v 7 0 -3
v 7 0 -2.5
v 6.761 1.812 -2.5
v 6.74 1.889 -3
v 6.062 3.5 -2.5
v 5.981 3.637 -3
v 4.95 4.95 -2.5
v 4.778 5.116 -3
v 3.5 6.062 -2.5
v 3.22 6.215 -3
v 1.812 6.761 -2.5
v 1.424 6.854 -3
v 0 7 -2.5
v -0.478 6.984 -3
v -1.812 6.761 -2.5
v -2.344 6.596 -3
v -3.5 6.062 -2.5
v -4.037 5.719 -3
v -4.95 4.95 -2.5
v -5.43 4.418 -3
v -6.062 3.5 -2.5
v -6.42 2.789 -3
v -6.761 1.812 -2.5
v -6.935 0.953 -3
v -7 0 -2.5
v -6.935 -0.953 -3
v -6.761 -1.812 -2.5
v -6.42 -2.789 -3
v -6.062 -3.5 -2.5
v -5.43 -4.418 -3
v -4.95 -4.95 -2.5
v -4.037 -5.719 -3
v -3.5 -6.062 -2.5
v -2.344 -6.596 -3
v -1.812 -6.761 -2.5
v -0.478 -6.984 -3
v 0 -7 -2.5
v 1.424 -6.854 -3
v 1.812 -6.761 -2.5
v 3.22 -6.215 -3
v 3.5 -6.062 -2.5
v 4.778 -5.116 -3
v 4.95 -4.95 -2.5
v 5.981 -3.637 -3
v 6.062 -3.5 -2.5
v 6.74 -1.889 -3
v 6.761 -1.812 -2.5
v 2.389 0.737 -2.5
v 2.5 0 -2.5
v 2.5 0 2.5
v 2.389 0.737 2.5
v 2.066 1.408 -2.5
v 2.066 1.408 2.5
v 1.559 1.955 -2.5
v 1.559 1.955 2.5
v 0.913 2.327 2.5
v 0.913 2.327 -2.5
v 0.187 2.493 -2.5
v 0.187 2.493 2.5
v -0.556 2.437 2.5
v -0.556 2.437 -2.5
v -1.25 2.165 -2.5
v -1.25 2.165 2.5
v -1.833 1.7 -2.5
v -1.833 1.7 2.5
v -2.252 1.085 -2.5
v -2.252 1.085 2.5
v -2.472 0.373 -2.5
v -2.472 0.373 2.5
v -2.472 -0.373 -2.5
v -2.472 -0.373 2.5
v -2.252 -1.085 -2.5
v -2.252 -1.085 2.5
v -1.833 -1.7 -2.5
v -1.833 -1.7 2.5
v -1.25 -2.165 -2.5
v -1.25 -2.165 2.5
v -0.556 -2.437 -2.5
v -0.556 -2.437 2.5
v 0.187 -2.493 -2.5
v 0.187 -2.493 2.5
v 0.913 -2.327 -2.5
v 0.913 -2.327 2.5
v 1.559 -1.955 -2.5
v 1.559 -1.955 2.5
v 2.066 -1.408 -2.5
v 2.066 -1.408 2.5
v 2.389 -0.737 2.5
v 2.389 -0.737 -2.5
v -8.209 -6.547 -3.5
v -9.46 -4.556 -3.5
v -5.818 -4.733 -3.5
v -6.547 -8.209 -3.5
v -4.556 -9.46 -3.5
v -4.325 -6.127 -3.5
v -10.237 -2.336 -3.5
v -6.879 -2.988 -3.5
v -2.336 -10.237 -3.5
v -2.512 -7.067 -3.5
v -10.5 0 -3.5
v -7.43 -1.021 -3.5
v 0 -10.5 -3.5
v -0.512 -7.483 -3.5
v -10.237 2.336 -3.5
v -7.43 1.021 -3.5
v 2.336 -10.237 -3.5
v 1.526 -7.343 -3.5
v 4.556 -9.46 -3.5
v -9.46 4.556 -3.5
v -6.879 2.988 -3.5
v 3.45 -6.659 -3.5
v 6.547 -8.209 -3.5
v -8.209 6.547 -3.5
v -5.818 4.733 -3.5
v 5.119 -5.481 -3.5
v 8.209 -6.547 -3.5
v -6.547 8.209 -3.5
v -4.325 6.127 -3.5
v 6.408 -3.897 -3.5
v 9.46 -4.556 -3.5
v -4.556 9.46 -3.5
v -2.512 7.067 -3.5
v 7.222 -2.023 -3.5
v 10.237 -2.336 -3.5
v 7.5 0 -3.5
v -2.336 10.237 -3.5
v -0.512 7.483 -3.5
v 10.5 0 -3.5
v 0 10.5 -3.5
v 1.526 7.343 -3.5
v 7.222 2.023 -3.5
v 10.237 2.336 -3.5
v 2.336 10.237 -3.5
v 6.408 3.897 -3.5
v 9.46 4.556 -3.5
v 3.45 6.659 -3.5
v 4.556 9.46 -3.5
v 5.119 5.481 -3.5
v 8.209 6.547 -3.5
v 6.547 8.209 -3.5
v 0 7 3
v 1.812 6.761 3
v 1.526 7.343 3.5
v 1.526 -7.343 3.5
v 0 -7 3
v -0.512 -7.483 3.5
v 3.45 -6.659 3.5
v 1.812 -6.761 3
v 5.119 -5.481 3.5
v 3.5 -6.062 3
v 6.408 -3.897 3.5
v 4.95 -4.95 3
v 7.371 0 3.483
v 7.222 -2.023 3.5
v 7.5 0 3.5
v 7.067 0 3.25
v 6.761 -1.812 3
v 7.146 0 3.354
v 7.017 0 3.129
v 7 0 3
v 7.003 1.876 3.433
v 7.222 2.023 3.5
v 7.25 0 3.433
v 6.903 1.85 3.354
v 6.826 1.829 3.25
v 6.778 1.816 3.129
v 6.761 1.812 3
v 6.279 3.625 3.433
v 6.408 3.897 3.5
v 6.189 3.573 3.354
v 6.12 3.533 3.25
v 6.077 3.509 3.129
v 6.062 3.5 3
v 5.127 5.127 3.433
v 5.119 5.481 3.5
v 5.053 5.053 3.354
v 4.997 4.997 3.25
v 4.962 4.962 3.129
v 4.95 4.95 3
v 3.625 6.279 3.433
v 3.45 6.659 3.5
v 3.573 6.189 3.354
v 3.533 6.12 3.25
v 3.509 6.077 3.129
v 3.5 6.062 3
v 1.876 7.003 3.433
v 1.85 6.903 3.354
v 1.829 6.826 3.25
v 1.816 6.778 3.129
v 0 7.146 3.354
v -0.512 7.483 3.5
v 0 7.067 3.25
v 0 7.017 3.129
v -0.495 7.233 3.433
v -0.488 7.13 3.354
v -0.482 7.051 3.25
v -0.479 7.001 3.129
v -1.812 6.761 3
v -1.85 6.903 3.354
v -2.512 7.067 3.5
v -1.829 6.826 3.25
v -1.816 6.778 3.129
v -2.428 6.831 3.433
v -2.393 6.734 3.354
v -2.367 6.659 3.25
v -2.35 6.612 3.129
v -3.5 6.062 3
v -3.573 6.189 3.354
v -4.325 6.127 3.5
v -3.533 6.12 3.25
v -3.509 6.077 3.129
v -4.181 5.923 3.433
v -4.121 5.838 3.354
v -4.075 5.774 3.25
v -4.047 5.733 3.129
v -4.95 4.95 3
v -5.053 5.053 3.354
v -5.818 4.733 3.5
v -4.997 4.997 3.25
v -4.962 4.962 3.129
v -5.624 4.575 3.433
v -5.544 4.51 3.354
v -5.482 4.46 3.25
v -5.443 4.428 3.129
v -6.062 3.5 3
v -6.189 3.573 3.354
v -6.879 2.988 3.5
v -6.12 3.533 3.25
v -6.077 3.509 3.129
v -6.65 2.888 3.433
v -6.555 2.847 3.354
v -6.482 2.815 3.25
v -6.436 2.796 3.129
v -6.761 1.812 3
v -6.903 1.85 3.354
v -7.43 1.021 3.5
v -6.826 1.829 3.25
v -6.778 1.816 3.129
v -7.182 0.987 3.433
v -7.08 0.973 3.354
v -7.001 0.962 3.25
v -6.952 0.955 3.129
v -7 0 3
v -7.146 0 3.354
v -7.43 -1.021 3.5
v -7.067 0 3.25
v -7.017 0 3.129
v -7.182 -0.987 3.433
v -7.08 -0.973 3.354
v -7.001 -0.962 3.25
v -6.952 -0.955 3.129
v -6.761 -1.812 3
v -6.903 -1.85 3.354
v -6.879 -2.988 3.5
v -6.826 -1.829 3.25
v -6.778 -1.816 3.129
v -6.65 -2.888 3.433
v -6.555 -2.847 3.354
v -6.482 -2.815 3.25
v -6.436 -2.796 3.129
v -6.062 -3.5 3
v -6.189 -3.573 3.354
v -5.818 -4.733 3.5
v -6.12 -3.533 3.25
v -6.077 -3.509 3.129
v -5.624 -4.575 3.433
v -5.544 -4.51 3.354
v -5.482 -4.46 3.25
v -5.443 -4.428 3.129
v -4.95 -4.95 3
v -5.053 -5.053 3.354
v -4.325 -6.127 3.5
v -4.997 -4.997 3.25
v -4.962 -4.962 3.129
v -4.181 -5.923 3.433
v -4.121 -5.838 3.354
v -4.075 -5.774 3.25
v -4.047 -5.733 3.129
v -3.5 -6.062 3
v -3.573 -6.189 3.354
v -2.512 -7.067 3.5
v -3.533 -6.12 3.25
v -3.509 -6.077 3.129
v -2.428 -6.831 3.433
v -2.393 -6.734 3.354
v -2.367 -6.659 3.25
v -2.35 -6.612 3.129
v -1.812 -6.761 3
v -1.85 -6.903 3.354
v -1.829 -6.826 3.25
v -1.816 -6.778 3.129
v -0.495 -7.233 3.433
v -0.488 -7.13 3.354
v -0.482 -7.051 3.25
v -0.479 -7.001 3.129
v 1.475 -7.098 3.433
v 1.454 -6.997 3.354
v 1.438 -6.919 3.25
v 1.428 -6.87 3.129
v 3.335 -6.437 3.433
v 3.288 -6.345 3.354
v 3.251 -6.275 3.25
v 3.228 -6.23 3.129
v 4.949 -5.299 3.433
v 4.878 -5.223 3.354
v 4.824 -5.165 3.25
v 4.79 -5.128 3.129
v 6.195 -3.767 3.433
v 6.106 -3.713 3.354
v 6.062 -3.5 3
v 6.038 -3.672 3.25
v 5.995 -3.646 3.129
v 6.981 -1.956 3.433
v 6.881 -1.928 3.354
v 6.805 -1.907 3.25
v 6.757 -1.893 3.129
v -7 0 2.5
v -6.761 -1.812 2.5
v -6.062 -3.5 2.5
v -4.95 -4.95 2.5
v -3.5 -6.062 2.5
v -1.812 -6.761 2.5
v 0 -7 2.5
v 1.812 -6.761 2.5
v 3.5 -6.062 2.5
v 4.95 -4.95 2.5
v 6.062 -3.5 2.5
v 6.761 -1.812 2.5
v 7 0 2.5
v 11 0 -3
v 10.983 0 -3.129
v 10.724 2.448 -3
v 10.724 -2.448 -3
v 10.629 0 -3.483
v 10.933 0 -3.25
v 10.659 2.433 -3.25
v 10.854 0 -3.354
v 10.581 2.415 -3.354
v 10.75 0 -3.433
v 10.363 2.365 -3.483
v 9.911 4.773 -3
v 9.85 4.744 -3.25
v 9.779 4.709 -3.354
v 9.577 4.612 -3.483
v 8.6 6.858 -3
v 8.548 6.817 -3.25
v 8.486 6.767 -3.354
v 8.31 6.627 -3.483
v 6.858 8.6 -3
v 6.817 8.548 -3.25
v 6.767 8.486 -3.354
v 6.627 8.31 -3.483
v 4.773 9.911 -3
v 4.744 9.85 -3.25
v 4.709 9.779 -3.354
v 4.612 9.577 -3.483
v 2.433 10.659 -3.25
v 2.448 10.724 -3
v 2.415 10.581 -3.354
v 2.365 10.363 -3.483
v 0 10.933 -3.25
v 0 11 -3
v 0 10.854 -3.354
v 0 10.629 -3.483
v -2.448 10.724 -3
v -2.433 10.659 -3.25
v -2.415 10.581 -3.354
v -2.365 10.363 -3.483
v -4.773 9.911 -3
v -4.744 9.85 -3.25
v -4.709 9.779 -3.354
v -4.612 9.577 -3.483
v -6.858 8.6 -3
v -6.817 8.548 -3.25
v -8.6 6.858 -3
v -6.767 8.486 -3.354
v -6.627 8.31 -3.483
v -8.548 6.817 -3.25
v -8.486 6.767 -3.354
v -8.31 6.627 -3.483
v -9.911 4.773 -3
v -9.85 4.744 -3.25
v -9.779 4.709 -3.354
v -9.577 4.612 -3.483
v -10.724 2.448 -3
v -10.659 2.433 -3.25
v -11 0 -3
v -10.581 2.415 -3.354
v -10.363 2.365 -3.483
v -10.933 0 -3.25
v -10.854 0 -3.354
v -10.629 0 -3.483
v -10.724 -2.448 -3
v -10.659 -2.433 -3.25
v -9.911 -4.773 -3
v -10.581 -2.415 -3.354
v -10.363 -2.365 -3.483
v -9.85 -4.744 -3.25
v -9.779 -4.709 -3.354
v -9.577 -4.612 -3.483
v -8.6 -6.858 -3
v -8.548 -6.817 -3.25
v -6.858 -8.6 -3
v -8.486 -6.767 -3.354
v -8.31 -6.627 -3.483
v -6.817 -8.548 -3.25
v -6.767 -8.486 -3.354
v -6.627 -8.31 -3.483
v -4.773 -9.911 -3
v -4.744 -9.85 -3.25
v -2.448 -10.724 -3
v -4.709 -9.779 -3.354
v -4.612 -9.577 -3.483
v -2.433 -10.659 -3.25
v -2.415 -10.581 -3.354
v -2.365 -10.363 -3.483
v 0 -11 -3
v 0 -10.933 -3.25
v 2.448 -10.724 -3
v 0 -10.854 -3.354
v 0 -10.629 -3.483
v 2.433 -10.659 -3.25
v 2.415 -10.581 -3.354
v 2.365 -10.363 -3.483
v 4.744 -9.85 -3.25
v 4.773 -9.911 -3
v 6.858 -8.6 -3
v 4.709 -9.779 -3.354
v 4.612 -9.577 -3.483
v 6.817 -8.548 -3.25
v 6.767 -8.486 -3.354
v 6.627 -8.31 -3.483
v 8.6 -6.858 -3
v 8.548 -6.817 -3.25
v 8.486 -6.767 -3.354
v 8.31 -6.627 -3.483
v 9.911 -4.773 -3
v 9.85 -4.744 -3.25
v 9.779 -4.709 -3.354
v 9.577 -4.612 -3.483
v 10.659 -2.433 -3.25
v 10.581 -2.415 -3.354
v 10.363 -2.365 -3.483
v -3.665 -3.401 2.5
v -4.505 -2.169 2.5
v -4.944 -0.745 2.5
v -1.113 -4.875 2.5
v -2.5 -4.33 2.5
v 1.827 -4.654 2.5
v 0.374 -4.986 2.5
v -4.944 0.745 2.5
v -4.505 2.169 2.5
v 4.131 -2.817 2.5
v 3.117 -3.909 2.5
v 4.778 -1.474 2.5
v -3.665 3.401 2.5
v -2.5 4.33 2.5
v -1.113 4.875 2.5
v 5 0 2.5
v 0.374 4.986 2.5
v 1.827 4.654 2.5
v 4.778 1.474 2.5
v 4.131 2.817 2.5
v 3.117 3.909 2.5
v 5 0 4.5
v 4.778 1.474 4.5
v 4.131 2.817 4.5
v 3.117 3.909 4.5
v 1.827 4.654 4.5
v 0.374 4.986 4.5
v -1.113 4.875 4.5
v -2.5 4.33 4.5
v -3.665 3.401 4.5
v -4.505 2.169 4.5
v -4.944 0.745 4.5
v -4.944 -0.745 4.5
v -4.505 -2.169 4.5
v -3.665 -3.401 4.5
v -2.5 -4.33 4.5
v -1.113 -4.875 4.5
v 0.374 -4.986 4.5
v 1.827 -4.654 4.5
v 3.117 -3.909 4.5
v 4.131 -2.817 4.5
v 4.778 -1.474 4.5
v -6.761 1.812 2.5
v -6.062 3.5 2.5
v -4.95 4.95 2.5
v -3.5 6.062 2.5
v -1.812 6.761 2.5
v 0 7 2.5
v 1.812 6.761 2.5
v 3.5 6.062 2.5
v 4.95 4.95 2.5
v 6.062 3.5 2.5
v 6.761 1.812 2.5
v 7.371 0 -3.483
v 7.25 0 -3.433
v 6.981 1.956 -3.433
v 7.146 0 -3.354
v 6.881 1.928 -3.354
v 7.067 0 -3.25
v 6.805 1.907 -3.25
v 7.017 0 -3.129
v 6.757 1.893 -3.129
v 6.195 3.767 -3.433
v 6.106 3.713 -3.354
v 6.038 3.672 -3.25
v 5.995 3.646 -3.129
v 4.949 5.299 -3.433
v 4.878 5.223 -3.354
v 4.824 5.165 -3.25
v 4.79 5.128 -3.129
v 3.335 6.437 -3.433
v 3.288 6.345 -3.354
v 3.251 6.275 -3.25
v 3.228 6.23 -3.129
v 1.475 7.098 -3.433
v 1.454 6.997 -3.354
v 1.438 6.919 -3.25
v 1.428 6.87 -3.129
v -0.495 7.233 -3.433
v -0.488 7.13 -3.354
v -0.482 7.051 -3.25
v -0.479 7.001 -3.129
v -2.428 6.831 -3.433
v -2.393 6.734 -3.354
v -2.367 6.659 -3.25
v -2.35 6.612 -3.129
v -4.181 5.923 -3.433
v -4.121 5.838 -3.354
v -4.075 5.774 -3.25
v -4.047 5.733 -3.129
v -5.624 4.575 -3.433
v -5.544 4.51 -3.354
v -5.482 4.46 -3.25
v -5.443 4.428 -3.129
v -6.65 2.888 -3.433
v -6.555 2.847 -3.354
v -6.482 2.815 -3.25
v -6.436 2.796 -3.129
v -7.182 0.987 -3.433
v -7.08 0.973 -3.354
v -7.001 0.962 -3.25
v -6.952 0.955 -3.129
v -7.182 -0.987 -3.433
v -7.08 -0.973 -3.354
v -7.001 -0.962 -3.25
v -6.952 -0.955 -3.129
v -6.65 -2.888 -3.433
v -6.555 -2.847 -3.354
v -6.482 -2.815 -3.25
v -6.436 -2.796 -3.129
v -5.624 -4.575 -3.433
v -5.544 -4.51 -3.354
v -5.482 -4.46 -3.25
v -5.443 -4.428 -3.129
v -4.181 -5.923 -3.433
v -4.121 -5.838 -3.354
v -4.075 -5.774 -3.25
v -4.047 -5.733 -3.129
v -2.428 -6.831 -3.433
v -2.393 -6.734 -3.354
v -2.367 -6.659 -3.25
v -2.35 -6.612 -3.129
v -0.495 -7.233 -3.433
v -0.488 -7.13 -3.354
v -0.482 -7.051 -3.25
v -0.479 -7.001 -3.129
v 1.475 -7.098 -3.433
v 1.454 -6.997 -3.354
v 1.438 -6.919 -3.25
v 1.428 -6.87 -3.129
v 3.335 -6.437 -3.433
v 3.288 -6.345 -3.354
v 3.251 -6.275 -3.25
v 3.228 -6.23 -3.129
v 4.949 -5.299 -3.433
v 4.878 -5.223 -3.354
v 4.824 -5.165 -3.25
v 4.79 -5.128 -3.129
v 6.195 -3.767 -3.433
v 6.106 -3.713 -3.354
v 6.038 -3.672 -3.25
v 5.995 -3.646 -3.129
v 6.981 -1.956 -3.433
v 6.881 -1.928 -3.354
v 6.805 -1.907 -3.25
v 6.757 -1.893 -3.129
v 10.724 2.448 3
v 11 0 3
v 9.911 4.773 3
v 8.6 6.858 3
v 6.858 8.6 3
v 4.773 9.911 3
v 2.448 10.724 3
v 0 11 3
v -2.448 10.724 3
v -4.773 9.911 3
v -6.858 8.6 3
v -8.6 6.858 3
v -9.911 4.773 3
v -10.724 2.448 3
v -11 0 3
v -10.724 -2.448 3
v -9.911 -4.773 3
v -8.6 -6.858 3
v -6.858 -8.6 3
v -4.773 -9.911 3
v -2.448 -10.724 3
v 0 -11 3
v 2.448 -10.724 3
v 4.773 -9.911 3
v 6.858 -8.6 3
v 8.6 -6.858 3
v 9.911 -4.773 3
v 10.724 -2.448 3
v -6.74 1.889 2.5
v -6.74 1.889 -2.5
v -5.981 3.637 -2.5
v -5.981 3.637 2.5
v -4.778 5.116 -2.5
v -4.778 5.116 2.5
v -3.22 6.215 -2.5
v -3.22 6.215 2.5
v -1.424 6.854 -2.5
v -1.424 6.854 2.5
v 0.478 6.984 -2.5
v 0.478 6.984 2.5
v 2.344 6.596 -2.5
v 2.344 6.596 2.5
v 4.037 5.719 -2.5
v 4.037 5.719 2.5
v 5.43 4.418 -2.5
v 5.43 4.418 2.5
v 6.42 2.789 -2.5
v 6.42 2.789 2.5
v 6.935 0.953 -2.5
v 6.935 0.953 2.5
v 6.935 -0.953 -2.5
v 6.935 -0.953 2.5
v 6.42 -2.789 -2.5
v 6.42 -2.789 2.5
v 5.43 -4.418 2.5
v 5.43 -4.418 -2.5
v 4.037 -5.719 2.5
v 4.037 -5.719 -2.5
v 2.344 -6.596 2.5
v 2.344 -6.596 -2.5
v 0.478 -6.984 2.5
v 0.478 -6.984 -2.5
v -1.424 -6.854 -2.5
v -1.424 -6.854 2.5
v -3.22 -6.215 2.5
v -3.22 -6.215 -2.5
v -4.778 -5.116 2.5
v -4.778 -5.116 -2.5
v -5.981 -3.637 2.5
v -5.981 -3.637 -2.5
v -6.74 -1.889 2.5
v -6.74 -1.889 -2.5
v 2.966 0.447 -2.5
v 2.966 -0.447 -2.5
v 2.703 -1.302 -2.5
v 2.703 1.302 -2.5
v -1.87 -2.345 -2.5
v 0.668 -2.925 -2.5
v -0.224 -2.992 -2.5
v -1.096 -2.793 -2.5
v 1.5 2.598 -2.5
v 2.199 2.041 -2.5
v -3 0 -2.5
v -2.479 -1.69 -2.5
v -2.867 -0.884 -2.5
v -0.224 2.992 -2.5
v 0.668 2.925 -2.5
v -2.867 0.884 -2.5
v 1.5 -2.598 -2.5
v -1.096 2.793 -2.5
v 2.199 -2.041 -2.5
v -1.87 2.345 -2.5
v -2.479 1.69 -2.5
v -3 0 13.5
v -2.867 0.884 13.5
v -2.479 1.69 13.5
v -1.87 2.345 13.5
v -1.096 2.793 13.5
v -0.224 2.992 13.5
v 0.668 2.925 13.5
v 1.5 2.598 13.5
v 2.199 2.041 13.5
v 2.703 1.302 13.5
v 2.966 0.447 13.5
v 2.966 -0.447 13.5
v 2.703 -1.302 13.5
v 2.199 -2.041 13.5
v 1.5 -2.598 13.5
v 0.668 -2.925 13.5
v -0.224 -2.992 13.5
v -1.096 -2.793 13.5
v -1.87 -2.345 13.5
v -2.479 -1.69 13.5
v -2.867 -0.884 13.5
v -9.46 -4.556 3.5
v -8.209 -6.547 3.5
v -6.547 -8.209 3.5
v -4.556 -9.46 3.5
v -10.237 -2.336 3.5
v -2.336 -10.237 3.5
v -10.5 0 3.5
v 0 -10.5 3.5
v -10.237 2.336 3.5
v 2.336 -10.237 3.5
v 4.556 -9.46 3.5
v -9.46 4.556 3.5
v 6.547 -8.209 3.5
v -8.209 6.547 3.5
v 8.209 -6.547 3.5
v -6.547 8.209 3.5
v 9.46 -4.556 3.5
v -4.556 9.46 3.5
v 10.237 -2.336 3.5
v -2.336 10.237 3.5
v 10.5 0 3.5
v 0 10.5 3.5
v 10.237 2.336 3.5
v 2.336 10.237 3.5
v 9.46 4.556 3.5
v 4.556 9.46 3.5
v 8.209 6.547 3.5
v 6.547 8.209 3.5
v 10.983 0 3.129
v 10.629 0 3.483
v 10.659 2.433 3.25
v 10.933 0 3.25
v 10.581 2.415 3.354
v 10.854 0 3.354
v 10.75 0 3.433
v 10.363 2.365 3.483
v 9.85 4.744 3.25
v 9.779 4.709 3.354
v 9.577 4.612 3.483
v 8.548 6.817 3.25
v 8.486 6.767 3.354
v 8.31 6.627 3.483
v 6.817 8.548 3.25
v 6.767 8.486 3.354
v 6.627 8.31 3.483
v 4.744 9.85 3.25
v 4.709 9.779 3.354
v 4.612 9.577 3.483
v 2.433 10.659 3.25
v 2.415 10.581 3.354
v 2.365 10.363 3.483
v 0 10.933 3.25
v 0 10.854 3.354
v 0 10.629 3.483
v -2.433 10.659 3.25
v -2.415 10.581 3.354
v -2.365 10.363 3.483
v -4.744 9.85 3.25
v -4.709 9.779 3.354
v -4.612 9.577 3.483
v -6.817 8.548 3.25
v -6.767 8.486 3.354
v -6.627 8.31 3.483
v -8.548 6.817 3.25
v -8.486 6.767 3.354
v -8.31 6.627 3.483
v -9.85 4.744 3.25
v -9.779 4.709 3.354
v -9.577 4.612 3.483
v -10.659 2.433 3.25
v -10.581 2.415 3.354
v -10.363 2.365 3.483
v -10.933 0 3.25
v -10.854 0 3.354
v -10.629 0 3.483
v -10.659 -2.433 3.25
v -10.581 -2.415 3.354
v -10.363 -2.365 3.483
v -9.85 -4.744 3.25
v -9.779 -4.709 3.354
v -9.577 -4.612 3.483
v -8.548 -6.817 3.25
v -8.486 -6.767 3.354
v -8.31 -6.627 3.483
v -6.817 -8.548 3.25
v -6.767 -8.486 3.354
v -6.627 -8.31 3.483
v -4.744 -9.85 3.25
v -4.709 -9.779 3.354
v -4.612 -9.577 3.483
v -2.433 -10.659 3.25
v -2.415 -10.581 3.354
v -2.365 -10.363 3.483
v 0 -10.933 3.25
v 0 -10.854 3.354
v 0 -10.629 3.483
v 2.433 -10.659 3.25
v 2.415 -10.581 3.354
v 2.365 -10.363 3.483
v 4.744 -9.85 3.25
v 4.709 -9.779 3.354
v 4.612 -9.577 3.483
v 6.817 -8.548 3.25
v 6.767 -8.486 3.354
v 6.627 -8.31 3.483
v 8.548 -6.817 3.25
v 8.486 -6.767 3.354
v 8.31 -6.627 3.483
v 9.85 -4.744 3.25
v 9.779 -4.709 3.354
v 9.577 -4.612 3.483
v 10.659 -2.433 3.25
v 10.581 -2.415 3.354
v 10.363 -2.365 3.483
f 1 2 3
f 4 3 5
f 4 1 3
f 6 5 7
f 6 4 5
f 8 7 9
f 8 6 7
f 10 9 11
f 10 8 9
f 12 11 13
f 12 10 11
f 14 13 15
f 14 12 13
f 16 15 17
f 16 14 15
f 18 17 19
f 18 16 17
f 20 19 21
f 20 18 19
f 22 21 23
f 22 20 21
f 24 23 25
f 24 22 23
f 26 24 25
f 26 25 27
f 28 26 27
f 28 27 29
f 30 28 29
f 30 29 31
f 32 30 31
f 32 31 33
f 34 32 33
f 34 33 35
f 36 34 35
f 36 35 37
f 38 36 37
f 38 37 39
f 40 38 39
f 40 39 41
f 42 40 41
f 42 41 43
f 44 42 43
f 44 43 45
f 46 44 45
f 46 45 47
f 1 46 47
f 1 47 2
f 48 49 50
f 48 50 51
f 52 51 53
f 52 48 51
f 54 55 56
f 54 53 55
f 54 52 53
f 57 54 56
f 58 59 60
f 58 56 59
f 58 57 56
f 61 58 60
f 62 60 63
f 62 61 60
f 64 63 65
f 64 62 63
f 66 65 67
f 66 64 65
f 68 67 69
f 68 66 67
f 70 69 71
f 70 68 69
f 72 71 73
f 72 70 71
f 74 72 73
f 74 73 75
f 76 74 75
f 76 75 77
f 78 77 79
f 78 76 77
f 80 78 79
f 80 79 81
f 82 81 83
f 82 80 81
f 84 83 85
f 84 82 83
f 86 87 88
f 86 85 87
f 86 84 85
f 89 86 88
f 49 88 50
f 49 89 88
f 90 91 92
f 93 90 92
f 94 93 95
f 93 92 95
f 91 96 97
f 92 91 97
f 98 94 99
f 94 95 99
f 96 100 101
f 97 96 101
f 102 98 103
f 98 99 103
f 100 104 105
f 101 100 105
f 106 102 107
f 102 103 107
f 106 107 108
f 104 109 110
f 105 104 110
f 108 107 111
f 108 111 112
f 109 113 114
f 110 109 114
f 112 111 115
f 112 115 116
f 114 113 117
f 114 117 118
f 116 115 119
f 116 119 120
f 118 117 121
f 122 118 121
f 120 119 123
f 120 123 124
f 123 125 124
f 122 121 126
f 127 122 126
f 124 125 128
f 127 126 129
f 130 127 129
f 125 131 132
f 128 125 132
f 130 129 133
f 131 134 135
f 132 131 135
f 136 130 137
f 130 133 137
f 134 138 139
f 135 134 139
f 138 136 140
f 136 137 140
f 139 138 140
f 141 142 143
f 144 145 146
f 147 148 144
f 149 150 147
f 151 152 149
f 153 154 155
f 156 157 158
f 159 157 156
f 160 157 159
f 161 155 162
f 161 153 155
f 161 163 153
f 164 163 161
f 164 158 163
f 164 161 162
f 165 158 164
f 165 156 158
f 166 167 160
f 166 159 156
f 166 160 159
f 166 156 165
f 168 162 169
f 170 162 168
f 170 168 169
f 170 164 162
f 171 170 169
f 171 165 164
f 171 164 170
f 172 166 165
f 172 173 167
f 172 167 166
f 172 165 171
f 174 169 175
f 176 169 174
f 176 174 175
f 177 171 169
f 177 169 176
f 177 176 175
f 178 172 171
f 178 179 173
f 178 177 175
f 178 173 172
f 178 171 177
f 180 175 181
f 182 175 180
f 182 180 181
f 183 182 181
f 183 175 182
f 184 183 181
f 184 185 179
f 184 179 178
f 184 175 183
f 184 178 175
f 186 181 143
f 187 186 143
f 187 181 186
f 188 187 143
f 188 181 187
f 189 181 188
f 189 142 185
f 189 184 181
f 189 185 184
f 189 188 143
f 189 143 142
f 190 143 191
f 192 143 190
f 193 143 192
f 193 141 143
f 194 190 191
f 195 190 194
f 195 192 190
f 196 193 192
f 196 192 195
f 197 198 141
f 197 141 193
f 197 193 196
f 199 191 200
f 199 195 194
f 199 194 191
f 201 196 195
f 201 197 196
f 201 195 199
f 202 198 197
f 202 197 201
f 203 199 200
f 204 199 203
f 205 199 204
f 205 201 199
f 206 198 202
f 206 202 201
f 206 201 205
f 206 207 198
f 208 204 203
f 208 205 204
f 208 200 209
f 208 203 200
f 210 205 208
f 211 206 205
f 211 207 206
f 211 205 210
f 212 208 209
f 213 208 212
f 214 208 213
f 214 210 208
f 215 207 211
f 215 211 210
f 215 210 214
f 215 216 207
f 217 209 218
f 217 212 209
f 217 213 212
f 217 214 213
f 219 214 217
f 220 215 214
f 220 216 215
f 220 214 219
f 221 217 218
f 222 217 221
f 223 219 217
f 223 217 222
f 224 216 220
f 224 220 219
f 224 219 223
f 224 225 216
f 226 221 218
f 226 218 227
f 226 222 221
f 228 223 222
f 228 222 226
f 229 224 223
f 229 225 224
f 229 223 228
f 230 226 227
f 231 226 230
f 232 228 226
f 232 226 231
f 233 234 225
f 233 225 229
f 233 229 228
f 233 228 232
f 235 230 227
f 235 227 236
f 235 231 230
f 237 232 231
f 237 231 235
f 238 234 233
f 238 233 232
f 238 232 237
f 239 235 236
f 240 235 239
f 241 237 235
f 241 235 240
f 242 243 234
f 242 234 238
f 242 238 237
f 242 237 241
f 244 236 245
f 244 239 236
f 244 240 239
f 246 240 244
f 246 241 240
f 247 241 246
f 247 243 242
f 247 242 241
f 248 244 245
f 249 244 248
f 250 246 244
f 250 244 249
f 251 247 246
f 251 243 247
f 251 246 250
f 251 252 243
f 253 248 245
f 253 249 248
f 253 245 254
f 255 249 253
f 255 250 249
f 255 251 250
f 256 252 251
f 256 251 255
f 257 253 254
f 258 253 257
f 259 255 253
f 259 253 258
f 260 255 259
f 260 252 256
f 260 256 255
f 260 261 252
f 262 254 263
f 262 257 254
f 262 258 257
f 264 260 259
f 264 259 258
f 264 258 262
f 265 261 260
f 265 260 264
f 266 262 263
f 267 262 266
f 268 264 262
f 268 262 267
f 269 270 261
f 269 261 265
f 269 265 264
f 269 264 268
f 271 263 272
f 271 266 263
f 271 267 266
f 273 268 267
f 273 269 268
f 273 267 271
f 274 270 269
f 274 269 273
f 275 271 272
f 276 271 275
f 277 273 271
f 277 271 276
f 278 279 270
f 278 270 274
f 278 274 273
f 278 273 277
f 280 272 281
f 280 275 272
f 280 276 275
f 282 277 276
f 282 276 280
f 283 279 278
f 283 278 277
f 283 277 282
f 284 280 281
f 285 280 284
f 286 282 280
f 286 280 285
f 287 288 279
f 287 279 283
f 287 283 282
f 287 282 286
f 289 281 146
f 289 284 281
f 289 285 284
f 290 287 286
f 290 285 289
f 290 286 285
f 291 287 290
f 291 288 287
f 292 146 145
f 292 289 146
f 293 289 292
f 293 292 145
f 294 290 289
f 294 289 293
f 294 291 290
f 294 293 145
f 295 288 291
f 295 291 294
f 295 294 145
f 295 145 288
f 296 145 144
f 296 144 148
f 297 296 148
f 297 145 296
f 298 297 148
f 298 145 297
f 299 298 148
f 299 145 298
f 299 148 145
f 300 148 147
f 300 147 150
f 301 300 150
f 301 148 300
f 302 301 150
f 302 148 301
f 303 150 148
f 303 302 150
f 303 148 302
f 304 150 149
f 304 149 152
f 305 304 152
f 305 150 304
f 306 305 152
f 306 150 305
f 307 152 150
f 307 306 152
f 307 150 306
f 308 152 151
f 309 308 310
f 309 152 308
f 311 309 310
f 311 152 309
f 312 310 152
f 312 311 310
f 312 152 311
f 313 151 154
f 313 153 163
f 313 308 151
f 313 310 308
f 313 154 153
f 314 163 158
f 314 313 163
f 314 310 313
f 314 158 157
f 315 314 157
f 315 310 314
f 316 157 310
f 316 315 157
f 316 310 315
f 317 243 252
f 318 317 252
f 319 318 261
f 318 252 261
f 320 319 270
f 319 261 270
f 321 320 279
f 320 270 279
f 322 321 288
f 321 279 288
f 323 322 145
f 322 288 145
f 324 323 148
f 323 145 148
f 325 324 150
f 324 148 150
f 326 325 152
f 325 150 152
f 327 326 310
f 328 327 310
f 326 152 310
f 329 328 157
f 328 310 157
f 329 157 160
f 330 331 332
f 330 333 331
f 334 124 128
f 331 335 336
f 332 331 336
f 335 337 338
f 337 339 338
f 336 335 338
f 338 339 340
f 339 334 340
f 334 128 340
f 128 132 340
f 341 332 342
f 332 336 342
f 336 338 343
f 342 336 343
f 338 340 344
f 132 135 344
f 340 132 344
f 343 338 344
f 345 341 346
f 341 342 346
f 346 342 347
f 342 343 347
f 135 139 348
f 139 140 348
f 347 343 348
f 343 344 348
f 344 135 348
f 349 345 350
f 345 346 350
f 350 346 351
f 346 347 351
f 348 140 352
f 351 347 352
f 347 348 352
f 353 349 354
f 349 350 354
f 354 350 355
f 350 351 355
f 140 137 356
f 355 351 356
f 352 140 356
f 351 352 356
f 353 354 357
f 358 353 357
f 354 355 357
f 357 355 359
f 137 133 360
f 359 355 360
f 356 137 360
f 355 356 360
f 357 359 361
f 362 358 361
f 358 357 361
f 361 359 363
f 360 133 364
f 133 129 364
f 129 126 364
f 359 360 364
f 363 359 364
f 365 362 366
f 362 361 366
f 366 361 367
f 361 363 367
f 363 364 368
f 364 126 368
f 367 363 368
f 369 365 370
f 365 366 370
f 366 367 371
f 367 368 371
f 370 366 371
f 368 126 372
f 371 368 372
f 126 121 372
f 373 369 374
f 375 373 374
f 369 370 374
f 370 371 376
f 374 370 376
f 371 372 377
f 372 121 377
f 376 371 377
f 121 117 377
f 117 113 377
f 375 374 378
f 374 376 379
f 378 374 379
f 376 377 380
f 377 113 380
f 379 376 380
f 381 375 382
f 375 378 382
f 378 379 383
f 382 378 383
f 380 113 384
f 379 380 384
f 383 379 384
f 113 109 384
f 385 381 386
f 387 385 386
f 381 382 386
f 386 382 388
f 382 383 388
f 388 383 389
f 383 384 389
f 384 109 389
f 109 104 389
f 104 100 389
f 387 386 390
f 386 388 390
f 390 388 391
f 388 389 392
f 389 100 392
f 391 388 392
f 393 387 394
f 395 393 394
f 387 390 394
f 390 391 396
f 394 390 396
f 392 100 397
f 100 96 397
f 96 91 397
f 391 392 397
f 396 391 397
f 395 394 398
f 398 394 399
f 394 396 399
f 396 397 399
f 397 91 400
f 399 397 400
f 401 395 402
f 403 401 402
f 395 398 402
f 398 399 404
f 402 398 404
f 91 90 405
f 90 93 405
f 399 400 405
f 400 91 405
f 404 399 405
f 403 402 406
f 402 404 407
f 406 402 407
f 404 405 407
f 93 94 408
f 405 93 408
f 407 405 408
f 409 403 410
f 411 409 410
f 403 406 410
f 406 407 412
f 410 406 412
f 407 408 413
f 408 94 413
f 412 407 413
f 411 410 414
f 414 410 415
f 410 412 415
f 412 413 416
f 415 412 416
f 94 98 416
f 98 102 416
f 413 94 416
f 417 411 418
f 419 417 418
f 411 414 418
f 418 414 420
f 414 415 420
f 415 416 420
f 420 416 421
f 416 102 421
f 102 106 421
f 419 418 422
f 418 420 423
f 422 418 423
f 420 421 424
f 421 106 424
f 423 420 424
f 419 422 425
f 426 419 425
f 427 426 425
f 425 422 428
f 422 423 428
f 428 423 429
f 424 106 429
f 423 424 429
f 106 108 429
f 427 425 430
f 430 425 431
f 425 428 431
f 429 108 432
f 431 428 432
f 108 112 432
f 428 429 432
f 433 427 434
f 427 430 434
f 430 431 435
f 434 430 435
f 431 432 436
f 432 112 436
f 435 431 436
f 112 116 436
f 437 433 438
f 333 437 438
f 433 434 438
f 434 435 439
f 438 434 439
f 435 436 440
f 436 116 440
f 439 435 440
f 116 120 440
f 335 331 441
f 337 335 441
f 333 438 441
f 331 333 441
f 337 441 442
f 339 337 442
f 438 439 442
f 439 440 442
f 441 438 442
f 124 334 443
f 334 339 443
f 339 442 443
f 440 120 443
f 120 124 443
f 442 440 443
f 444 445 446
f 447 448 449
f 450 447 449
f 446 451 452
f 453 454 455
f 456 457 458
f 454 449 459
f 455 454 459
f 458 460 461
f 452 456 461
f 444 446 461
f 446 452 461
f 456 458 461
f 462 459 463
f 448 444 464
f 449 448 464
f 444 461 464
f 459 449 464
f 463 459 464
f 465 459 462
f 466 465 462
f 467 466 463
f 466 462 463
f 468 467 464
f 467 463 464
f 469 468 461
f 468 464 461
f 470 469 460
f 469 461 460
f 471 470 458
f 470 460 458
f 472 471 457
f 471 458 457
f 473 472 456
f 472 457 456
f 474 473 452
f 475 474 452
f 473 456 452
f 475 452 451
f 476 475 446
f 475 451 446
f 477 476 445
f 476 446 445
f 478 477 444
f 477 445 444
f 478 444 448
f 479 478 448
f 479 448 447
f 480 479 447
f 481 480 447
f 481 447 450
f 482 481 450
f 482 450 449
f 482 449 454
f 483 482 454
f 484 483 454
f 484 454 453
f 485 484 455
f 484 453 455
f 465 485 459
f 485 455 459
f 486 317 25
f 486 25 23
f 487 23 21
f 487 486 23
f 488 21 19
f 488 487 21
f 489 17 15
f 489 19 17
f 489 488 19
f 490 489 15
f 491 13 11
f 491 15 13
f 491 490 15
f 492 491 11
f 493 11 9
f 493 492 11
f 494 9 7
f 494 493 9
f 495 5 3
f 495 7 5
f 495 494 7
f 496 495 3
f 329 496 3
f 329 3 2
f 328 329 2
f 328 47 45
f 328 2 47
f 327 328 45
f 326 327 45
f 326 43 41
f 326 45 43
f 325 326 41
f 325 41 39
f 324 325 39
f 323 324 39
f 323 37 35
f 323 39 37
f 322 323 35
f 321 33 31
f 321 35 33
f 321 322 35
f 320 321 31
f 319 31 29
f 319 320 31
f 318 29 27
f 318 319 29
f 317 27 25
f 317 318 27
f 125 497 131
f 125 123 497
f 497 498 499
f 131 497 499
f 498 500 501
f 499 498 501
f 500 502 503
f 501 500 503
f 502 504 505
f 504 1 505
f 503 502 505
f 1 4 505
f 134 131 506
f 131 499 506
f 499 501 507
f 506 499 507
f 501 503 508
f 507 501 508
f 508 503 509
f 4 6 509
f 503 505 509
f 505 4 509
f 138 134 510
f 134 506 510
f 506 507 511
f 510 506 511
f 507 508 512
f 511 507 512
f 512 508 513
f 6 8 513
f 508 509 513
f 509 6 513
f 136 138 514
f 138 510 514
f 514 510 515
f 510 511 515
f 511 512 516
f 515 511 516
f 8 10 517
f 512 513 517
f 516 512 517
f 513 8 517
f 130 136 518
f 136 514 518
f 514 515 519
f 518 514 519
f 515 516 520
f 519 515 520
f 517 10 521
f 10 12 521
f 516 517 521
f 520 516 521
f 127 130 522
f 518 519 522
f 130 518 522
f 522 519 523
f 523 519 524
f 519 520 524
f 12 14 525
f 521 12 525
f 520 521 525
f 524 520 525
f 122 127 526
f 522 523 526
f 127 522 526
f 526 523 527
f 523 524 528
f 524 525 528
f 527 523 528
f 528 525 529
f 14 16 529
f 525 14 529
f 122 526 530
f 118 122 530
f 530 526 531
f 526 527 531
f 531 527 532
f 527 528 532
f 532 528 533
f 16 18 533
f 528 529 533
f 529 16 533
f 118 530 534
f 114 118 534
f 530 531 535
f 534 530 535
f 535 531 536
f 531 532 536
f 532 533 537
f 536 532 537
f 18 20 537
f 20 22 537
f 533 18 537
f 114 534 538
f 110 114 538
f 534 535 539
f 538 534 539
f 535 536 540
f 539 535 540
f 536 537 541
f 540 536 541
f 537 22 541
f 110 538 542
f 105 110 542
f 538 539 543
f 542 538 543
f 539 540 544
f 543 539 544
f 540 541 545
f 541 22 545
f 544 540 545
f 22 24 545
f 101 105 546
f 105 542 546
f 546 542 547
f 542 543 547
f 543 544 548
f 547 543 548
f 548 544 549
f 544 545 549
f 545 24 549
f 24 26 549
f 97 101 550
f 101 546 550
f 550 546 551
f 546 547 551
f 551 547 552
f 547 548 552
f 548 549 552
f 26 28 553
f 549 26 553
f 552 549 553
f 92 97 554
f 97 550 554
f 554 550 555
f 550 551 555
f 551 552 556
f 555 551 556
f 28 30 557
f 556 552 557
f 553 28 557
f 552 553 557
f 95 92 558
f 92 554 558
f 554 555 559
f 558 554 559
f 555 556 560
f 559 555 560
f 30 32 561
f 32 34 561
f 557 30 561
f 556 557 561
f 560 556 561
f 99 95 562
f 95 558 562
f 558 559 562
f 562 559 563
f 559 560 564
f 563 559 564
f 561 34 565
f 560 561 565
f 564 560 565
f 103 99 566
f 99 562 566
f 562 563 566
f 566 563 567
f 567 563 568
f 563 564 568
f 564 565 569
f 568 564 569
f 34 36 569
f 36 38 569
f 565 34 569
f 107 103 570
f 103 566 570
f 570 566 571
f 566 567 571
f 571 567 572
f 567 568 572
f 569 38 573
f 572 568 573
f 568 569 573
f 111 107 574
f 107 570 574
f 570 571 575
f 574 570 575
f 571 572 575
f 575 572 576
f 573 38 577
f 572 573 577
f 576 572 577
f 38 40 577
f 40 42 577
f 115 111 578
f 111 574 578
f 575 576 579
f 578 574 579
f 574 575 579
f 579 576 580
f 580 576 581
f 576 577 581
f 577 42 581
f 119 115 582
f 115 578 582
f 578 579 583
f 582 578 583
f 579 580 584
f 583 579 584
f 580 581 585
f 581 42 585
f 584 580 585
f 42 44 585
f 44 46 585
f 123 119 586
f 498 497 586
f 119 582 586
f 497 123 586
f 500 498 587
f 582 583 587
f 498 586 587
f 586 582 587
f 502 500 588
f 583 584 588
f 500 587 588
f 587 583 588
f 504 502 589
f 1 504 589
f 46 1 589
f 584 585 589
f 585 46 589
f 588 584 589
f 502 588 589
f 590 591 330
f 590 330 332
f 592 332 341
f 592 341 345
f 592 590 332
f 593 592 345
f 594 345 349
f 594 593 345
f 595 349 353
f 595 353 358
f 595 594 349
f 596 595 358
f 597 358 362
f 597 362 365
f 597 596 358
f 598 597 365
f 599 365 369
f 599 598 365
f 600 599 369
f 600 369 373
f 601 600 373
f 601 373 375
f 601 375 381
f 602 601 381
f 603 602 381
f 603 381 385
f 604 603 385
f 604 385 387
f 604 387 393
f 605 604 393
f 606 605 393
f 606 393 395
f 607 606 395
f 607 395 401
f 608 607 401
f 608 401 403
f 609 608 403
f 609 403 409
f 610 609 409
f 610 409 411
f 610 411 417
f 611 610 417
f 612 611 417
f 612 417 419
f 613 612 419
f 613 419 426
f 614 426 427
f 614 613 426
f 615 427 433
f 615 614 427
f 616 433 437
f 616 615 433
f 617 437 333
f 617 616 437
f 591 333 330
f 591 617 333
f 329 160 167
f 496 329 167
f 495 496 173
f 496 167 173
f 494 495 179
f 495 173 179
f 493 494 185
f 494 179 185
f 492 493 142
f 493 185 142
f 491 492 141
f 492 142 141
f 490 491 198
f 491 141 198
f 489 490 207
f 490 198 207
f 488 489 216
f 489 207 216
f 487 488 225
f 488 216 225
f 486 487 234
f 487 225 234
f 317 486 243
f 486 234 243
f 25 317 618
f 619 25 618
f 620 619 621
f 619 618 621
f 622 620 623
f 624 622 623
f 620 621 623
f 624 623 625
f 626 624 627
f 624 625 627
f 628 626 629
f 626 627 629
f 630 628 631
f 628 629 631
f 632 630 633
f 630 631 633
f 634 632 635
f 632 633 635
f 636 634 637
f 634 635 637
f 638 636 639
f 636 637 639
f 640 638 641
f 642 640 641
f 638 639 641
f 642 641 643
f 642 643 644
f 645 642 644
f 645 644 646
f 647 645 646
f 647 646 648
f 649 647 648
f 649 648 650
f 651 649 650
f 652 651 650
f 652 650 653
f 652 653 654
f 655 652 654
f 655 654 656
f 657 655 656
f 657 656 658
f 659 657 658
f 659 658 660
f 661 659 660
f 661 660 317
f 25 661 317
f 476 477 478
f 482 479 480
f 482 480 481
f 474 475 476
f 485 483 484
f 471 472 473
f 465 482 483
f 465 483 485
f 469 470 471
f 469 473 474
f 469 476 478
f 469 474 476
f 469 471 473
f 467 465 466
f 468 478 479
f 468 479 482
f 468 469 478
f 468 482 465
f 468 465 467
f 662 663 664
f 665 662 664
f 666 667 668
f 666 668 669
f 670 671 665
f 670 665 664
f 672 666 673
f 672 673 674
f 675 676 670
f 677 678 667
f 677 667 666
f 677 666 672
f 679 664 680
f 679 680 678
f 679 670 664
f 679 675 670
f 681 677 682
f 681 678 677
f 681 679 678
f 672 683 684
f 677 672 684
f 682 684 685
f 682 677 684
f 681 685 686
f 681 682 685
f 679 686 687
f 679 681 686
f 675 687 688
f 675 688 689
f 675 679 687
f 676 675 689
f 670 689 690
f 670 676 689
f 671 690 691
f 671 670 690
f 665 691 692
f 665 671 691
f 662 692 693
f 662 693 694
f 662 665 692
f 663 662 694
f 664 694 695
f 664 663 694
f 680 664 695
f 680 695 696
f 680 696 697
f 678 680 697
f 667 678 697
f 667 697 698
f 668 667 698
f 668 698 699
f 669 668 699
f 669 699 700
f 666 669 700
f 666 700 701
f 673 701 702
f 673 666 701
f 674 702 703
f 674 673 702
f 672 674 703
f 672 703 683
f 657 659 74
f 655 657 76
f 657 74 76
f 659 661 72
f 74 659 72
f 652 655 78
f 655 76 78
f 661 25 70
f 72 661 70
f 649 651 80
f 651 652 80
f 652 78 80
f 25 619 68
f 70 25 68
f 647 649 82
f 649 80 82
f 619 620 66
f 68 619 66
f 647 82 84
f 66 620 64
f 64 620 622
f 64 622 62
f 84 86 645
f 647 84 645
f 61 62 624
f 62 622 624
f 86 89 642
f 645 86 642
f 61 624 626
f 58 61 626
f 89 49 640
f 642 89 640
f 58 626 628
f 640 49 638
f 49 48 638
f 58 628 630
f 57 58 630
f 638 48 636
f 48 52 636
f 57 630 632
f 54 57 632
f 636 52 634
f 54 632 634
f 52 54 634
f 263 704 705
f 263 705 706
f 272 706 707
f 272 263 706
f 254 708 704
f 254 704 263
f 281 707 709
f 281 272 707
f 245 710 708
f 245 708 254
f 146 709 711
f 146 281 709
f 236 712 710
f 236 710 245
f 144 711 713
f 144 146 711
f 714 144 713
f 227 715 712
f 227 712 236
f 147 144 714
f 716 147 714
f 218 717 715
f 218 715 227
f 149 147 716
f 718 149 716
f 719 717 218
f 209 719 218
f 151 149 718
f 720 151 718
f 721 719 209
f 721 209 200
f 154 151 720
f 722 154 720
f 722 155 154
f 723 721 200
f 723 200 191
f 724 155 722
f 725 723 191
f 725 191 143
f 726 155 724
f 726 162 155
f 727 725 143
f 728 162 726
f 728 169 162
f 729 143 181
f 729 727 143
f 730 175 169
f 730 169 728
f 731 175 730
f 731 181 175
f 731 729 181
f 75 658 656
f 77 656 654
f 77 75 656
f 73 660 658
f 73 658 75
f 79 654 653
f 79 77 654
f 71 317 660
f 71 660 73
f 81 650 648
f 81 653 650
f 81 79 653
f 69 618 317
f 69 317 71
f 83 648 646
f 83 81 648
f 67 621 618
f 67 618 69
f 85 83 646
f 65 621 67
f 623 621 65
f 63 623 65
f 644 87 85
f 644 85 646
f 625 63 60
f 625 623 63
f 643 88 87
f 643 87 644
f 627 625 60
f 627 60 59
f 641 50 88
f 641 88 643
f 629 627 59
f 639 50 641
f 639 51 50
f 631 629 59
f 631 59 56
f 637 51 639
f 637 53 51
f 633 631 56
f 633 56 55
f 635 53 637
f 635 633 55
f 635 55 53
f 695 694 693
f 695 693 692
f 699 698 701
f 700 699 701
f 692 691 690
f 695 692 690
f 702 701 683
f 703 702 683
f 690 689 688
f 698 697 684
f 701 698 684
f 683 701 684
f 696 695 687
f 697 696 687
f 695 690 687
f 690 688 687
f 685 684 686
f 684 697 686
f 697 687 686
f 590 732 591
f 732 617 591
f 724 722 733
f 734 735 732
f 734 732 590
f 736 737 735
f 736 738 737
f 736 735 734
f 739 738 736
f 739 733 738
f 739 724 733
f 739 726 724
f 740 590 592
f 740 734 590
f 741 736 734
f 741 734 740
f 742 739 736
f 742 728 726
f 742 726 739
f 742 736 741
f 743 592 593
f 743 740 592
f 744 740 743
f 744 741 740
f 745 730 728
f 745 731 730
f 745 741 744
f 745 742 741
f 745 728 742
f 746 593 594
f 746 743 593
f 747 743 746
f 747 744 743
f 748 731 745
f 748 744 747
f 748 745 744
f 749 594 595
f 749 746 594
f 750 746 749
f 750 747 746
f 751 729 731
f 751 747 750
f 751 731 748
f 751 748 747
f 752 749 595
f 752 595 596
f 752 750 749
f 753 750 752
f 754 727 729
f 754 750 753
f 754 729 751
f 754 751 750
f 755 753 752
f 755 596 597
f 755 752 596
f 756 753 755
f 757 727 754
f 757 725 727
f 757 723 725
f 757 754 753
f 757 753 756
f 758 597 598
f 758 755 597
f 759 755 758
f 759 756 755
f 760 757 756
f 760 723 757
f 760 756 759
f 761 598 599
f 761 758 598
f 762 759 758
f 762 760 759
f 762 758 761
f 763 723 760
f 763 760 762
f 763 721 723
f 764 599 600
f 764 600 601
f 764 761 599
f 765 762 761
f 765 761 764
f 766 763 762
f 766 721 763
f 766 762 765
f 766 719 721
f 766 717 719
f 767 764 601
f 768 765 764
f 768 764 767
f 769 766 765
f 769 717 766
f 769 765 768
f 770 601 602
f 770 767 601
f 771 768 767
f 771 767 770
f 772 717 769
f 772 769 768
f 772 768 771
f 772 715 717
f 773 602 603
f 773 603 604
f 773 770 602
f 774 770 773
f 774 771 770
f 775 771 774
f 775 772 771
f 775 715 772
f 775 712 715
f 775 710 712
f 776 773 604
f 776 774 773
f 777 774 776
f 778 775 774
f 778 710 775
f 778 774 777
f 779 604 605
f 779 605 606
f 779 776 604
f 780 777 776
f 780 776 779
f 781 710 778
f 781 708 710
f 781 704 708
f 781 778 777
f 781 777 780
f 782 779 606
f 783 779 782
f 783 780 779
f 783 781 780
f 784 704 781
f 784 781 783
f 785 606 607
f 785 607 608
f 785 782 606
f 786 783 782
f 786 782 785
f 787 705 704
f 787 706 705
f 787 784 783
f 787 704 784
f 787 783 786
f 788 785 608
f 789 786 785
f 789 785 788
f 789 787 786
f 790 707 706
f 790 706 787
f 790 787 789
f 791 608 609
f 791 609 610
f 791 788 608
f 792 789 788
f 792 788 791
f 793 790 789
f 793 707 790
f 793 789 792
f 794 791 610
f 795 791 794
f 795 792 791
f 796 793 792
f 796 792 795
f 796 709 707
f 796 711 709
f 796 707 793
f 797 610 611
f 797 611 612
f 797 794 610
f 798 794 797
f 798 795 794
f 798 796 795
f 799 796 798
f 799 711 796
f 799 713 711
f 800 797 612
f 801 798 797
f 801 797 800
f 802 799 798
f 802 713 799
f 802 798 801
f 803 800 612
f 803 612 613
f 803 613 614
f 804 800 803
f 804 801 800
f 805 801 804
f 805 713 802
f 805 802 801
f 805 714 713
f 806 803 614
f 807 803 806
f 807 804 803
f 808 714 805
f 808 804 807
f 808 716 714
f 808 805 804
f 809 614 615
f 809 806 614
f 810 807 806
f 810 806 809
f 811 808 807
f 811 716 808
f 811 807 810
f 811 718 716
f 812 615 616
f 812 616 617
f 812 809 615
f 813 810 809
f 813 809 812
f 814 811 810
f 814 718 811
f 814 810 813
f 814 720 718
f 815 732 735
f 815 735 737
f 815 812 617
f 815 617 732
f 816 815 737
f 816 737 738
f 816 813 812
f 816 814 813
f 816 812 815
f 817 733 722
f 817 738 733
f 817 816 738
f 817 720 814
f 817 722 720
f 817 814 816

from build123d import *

# Parameters (mm, degrees)
SKETCH_1_R              = 11
SKETCH_1_R_2            = 2.5
EXTRUDE_1_DEPTH         = 3.5
SKETCH_2_R              = 7
CUT_EXTRUDE_1_DEPTH     = 1
SHEET_EXTRUDE_1_1_BACK  = 14
SHEET_EXTRUDE_1_1_DEPTH = 14
SHEET_EXTRUDE_1_2_BACK  = 14
SHEET_EXTRUDE_1_2_DEPTH = 14
FILLET_1_R              = 0.5
SKETCH_5_R              = 3
EXTRUDE_3_DEPTH         = 16
SKETCH_6_R              = 5
EXTRUDE_4_DEPTH         = 2


with BuildPart() as part:
    # 草图1 → 凸台-拉伸1 (new, symmetric)
    with BuildSketch(Plane.XY):
        Circle(SKETCH_1_R)
        Circle(SKETCH_1_R_2, mode=Mode.SUBTRACT)
    extrude(amount=EXTRUDE_1_DEPTH, both=True)

    # 草图2 → 切除-拉伸1 (cut)
    with BuildSketch(Plane.XY.offset(3.5)):
        Circle(SKETCH_2_R)
    cut_extrude_1 = extrude(amount=-CUT_EXTRUDE_1_DEPTH, mode=Mode.SUBTRACT)

    # 镜向1: 切除-拉伸1 across plane
    add(cut_extrude_1.mirror(Plane.XY), mode=Mode.SUBTRACT)


with BuildPart() as body_2:
    # Split Bodies 1: the piece behind the surface
    add(part.part)
    # Sheet 凸台-拉伸1: a surface, the sketch's curves swept straight by 14 mm
    with BuildLine(Plane(origin=(0, 0, -2.5), x_dir=(-1, 0, 0), z_dir=(0, 0, -1)).offset(-SHEET_EXTRUDE_1_1_BACK), mode=Mode.PRIVATE) as sheet_extrude_1_1_path:
        CenterArc((0, 0), 7, 0, 360)
    sheet_extrude_1_1 = Shell.extrude(sheet_extrude_1_1_path.wire(), (0 * SHEET_EXTRUDE_1_1_DEPTH, 0 * SHEET_EXTRUDE_1_1_DEPTH, -1 * SHEET_EXTRUDE_1_1_DEPTH))
    split(bisect_by=sheet_extrude_1_1, keep=Keep.BOTTOM)

    # 圆角1
    fillet_1_edges = [body_2.edges().sort_by_distance(p)[0] for p in [
        (-7, 0, -3.5),
        (0, 7, 3.5),
        (-11, 0, -3.5),
        (-11, 0, 3.5),
    ]]
    fillet(fillet_1_edges, radius=FILLET_1_R)


with BuildPart() as part_1:
    add(part.part)

    # Split Bodies 1: split by a surface, the side it looks to stays
    # Sheet 凸台-拉伸1: a surface, the sketch's curves swept straight by 14 mm
    with BuildLine(Plane(origin=(0, 0, -2.5), x_dir=(-1, 0, 0), z_dir=(0, 0, -1)).offset(-SHEET_EXTRUDE_1_2_BACK), mode=Mode.PRIVATE) as sheet_extrude_1_2_path:
        CenterArc((0, 0), 7, 0, 360)
    sheet_extrude_1_2 = Shell.extrude(sheet_extrude_1_2_path.wire(), (0 * SHEET_EXTRUDE_1_2_DEPTH, 0 * SHEET_EXTRUDE_1_2_DEPTH, -1 * SHEET_EXTRUDE_1_2_DEPTH))
    split(bisect_by=sheet_extrude_1_2, keep=Keep.TOP)


with BuildPart() as body_3:
    # 草图5 → 凸台-拉伸3 (new body)
    with BuildSketch(Plane(origin=(0, 0, -2.5), x_dir=(-1, 0, 0), z_dir=(0, 0, -1))):
        Circle(SKETCH_5_R)
    extrude(amount=-EXTRUDE_3_DEPTH)


with BuildPart() as body_4:
    # 草图6 → 凸台-拉伸4 (new body)
    with BuildSketch(Plane.XY.offset(2.5)):
        Circle(SKETCH_6_R)
    extrude(amount=EXTRUDE_4_DEPTH)


solid = Compound([body_2.part, part_1.part, body_3.part, body_4.part])
